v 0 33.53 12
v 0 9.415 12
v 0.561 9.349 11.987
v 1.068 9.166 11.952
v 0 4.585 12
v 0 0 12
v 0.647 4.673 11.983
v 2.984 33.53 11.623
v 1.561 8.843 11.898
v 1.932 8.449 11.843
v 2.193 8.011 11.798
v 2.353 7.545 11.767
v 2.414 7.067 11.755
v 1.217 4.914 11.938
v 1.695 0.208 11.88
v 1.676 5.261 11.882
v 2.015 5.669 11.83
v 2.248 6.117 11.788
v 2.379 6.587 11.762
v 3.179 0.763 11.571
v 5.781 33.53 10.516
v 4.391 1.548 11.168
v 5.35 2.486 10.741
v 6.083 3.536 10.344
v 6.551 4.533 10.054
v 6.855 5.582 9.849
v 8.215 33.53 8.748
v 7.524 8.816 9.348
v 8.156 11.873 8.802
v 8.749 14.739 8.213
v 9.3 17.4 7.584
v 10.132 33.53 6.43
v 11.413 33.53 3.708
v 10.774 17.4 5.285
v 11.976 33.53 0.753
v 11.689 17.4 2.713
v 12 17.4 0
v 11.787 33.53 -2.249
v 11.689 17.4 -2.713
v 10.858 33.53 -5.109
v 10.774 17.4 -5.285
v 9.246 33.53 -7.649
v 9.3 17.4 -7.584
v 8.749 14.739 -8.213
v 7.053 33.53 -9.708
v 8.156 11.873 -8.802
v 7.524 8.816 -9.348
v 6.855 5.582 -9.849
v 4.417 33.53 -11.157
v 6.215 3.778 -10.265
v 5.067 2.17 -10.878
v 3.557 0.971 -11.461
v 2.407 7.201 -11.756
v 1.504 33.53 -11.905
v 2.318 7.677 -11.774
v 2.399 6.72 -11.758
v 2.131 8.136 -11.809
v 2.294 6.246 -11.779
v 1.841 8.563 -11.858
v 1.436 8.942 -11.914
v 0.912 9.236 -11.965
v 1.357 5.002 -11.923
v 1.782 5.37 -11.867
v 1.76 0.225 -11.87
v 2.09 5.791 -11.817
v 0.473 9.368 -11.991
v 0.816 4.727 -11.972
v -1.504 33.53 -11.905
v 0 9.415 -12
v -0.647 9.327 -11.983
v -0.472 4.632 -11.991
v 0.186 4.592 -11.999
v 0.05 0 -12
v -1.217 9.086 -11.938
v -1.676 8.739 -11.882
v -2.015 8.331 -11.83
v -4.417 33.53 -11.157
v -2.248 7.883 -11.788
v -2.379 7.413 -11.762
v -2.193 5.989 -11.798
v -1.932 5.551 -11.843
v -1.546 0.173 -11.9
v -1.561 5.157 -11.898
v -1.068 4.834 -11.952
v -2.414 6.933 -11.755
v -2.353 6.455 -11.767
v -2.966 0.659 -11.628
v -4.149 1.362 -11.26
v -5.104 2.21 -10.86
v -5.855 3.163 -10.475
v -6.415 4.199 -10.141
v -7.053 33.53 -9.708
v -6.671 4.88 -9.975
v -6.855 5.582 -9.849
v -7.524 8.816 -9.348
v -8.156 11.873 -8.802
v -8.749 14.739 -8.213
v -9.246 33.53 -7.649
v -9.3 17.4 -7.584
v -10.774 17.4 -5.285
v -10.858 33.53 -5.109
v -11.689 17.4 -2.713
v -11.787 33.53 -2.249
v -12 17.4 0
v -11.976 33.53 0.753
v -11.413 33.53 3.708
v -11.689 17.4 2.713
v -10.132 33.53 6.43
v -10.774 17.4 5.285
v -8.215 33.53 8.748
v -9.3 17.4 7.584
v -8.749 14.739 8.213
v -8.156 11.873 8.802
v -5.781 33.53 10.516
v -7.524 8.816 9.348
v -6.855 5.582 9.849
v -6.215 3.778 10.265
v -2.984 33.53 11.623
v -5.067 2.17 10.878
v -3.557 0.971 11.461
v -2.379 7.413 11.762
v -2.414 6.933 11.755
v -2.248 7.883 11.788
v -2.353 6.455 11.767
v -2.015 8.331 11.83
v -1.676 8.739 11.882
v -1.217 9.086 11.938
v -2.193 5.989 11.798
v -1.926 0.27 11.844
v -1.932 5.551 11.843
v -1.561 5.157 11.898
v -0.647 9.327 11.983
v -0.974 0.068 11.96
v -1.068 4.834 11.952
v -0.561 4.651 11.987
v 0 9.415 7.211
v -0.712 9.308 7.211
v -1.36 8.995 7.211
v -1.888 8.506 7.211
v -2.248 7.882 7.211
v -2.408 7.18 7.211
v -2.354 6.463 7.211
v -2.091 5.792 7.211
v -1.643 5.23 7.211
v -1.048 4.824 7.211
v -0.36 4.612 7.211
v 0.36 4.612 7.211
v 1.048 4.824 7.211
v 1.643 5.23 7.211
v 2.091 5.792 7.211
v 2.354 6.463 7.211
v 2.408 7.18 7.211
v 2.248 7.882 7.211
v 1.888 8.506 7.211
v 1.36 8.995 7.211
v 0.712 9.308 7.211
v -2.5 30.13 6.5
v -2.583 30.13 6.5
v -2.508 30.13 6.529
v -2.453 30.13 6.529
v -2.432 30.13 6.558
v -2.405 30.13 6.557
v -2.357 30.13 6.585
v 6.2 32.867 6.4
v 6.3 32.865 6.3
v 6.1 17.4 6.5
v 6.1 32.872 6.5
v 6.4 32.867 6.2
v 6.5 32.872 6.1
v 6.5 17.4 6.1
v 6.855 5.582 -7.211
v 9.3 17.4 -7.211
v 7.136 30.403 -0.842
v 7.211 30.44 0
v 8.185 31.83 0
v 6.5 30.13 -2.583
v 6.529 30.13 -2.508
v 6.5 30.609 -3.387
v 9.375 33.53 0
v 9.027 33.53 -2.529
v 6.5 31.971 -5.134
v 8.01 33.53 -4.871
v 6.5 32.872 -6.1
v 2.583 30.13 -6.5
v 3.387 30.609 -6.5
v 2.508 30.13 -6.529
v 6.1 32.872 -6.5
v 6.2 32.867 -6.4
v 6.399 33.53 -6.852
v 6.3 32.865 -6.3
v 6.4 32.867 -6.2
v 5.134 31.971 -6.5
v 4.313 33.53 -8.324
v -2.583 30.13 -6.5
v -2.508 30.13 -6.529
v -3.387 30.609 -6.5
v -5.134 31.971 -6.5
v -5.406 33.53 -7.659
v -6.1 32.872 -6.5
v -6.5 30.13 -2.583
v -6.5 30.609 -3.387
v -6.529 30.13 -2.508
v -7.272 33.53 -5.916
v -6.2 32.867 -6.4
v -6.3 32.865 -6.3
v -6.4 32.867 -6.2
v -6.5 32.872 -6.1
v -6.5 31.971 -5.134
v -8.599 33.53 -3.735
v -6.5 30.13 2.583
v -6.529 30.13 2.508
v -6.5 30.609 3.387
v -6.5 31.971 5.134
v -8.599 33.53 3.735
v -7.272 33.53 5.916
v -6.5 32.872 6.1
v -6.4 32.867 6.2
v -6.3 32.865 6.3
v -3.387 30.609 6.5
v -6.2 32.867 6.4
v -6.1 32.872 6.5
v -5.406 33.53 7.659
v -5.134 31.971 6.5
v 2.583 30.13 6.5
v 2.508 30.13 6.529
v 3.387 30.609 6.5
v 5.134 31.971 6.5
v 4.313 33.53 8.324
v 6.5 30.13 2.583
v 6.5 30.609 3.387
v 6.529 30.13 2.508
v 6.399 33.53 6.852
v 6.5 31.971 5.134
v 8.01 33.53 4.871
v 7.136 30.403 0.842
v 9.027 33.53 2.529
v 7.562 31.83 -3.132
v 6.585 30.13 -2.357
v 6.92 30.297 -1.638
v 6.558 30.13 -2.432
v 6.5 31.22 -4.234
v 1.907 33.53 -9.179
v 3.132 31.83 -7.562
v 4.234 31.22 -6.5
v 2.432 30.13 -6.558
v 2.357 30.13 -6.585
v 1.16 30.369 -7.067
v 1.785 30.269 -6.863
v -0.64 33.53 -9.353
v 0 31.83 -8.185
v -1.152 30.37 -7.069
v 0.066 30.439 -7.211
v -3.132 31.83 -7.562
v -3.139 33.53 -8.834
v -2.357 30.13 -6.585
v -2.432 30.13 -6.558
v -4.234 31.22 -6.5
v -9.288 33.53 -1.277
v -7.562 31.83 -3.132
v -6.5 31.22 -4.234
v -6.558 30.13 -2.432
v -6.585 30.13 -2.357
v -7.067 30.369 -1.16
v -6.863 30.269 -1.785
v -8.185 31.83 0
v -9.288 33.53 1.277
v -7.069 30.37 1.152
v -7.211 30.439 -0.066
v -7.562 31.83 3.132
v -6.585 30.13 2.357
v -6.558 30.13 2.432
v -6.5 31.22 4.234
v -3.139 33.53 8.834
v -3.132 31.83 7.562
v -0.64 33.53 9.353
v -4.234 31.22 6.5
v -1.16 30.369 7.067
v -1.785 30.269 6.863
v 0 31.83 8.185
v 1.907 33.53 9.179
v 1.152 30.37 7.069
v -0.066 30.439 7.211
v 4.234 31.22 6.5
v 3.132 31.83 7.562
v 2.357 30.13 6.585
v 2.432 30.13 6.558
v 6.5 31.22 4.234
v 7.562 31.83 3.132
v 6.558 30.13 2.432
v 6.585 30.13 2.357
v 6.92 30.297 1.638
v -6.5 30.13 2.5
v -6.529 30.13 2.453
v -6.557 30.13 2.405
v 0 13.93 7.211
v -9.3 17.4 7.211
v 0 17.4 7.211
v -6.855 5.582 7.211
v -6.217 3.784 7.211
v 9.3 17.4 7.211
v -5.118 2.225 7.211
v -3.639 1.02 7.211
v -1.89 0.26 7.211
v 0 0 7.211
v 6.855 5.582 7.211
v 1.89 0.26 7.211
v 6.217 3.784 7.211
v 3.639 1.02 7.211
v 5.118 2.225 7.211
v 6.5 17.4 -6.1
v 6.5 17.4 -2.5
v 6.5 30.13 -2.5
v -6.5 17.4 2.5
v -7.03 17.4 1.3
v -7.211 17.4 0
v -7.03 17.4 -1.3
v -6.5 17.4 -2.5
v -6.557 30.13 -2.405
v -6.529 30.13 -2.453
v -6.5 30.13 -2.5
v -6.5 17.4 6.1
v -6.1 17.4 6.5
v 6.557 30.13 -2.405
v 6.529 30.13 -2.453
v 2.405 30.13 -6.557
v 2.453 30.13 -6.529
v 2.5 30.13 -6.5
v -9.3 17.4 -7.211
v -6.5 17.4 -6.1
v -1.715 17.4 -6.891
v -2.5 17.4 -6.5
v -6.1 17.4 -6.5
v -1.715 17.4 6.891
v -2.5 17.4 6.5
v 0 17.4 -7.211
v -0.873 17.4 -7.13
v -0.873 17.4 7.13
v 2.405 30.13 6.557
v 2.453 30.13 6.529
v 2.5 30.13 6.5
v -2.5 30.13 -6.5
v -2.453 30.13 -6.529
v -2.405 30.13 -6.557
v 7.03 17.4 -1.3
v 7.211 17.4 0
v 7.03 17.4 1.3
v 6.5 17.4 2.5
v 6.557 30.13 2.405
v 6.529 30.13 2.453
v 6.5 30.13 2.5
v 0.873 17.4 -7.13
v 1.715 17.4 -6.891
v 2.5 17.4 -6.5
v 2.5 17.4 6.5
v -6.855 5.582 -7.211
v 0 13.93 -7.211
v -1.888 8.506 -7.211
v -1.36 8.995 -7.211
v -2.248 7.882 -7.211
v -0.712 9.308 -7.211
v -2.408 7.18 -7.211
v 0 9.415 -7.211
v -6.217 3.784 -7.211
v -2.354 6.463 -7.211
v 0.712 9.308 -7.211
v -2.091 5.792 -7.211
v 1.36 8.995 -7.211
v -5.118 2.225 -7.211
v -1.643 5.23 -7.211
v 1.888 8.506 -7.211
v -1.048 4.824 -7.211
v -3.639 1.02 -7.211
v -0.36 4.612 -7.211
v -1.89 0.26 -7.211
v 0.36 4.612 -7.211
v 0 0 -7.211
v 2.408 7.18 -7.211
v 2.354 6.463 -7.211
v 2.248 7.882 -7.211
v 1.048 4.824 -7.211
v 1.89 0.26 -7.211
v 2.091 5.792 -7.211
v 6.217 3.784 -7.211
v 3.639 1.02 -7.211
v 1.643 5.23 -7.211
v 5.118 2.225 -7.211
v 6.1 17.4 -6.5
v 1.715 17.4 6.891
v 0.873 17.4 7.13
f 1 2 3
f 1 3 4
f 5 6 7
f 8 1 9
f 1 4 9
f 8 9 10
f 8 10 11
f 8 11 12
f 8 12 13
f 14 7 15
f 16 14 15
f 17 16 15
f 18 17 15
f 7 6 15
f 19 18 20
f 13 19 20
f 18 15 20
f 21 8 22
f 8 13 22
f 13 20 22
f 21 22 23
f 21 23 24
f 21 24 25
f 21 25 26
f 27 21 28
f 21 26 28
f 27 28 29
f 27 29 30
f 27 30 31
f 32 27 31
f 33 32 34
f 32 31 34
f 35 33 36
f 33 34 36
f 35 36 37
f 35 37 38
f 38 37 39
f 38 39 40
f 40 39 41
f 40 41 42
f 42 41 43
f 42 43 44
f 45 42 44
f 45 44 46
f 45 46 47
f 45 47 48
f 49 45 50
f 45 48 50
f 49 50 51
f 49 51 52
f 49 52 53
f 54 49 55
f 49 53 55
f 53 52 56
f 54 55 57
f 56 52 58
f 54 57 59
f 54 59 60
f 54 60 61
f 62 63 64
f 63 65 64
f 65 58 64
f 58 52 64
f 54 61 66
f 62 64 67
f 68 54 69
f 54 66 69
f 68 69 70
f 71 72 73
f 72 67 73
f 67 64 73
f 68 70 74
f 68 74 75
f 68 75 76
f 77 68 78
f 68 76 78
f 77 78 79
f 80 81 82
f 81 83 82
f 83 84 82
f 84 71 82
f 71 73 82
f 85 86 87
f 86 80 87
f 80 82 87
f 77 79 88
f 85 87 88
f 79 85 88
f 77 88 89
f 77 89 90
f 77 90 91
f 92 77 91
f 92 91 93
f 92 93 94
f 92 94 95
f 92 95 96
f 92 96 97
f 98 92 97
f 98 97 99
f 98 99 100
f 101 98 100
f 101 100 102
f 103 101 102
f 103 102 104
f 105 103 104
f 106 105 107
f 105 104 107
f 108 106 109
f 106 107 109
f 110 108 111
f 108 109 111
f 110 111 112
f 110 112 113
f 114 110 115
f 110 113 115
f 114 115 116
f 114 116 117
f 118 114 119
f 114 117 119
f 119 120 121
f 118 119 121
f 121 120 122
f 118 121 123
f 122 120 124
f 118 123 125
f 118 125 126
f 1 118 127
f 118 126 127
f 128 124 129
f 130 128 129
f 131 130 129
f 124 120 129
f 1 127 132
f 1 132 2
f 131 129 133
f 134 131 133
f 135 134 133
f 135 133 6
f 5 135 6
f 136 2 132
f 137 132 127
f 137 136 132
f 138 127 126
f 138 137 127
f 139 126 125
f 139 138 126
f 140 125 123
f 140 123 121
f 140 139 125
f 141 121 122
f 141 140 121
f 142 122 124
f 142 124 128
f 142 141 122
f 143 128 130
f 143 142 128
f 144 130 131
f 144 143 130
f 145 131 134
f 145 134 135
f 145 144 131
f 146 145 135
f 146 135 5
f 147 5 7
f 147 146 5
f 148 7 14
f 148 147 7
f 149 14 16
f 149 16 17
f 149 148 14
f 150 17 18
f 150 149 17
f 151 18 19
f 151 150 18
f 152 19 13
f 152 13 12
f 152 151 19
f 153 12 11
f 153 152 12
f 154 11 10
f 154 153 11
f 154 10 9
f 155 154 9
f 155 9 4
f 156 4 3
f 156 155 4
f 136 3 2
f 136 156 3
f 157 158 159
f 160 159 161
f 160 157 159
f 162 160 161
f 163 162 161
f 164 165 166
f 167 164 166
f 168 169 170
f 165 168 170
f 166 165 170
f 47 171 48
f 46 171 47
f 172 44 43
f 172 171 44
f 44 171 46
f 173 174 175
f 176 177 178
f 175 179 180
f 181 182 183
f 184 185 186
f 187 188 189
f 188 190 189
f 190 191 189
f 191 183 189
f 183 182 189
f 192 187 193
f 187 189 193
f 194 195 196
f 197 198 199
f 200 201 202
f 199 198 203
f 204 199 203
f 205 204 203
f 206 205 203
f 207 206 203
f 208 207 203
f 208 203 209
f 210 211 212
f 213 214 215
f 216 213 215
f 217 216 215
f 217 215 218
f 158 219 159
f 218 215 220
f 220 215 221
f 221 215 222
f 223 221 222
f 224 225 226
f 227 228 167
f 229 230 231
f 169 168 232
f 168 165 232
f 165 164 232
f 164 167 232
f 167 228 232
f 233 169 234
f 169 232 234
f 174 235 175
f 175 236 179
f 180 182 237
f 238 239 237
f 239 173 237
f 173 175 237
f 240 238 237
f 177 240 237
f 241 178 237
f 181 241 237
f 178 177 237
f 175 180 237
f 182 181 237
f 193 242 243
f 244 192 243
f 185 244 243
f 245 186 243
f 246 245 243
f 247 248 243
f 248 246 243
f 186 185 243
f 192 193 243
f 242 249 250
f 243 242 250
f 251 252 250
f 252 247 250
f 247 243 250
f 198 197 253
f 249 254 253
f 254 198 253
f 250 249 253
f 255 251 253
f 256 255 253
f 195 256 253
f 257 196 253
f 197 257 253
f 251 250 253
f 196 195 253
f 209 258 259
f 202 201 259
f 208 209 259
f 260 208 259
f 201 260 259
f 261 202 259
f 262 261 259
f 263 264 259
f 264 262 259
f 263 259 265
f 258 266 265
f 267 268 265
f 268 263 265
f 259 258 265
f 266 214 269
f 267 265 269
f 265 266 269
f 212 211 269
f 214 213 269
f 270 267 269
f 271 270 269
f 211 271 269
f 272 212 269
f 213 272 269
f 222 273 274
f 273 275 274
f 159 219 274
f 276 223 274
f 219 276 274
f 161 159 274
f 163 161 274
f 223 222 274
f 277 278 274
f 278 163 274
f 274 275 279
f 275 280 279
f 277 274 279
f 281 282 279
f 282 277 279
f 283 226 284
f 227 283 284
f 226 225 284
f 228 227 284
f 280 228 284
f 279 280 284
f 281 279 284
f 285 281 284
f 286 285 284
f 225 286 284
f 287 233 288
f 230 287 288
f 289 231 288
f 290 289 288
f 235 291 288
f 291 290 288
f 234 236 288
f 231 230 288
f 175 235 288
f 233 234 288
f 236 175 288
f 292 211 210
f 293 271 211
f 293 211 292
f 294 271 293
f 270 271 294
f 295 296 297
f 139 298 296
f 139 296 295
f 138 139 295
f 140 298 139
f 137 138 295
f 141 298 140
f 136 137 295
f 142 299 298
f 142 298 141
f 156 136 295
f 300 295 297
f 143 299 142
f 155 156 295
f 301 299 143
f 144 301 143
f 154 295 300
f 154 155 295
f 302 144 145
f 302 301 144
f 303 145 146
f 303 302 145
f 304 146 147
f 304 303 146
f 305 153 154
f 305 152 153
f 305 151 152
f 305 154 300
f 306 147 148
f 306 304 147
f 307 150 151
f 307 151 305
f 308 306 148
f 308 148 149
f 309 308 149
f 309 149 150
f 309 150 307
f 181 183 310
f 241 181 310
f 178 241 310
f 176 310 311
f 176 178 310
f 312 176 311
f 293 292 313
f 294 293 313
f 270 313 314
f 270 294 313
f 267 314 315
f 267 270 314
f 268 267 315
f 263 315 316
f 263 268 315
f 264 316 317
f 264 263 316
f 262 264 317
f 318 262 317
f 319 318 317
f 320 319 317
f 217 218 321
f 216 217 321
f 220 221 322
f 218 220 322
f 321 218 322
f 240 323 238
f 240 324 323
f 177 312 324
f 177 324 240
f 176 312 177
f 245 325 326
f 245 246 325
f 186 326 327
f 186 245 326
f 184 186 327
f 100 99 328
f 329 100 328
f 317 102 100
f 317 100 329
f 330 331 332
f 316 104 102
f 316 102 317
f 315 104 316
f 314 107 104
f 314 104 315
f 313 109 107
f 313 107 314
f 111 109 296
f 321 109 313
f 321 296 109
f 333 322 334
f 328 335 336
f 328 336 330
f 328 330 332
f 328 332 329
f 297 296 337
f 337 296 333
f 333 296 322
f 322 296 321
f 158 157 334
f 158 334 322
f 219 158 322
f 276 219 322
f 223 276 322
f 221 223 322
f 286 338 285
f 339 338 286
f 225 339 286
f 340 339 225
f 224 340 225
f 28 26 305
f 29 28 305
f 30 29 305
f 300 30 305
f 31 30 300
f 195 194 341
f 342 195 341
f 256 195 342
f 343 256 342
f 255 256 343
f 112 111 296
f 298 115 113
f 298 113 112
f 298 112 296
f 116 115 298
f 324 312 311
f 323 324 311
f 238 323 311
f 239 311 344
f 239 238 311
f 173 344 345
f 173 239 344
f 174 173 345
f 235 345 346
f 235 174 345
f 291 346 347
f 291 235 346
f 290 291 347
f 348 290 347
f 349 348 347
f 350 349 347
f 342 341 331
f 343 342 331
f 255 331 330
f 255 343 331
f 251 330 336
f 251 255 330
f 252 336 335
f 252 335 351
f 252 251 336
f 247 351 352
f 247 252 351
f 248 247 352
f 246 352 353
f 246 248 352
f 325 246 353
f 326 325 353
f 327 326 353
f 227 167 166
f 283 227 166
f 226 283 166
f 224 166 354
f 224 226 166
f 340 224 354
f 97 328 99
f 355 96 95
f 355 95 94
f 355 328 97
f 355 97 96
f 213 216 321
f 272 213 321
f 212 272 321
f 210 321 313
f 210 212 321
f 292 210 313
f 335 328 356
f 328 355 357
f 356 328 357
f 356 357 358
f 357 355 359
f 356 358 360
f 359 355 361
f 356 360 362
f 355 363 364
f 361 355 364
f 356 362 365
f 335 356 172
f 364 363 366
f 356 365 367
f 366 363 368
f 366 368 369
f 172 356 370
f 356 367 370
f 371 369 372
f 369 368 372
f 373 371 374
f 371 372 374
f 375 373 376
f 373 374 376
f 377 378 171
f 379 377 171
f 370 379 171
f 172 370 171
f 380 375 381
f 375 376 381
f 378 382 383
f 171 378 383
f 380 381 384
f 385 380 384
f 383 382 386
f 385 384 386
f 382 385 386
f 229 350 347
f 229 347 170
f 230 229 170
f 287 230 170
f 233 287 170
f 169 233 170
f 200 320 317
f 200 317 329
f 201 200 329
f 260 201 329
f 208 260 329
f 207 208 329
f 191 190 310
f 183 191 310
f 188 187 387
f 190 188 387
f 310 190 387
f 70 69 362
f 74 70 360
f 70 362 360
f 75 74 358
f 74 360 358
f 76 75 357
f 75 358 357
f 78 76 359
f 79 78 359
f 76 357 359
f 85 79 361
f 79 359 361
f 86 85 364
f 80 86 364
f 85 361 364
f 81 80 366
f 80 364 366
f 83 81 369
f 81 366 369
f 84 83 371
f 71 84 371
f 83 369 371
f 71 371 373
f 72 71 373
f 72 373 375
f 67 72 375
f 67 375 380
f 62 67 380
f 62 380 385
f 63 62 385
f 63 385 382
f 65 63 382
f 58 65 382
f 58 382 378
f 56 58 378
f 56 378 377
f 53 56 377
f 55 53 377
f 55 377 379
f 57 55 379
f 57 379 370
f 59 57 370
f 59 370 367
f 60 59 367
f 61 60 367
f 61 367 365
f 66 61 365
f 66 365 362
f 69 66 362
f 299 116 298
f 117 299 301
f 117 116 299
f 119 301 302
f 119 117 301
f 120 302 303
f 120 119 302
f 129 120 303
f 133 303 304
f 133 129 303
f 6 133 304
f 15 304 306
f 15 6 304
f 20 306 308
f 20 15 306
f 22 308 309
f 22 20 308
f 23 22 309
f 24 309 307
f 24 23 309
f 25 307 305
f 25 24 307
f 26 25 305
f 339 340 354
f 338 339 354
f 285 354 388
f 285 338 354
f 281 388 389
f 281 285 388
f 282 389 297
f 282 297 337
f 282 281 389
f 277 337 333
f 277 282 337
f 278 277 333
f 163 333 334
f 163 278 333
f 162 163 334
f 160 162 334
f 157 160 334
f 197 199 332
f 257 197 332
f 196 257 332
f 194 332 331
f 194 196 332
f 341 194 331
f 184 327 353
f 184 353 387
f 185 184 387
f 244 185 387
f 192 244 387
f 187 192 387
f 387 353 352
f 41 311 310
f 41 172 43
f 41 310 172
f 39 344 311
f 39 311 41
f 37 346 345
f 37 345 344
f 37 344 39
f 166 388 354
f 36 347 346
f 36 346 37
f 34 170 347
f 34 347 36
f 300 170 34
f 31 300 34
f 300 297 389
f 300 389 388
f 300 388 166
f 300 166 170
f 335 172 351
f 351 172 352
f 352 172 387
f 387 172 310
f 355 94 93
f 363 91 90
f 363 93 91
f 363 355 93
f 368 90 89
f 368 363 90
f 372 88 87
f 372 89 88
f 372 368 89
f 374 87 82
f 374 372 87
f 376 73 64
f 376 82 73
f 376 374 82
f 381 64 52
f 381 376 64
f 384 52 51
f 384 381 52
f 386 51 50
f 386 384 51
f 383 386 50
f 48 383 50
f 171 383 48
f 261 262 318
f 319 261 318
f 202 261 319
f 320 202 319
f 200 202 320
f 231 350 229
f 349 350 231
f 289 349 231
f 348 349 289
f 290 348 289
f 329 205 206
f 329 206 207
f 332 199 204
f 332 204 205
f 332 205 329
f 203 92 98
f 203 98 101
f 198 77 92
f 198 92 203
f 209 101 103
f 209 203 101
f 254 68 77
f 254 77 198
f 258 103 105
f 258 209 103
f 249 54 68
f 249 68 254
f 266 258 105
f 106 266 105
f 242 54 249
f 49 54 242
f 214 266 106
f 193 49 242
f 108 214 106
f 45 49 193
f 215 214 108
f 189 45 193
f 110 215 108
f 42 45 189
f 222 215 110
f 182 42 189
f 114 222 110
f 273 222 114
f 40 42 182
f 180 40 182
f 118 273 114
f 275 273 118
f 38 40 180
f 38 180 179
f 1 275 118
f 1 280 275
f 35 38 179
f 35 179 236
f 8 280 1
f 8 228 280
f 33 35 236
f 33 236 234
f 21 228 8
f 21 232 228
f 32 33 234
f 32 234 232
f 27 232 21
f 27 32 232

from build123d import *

# Parameters (mm, degrees)
SKETCH1_R           = 12
BOSS_EXTRUDE1_DEPTH = 33.53
CUT_EXTRUDE1_DEPTH  = 19.6
CHAMFER1_SIZE       = 0.4
SKETCH3_R           = 9.375
CUT_EXTRUDE2_DEPTH  = 3.4
CUT_EXTRUDE2_DRAFT  = -35
SKETCH4_W           = 24
SKETCH4_H           = 14.42225279
CUT_EXTRUDE3_DEPTH  = 17.4
SKETCH5_R           = 2.415
CUT_EXTRUDE4_DEPTH  = 33.7


with BuildPart() as part:
    # Sketch1 → Boss-Extrude1 (new body)
    with BuildSketch(Plane(origin=(0, 0, 0), x_dir=(1, 0, 0), z_dir=(0, 1, 0))):
        with Locations(Location((0, 0, 0), (0, 0, 270))):
            Circle(SKETCH1_R)
    extrude(amount=BOSS_EXTRUDE1_DEPTH)

    # Sketch2 → Cut-Extrude1 (cut)
    with BuildSketch(Plane(origin=(0, 33.53, 0), x_dir=(1, 0, 0), z_dir=(0, 1, 0))):
        with BuildLine():
            Line((-6.5, 6.5), (-2.5, 6.5))
            ThreePointArc((-2.5, 6.5), (0, 7.211126395), (2.5, 6.5))
            Line((2.5, 6.5), (6.5, 6.5))
            Line((6.5, 6.5), (6.5, 2.5))
            ThreePointArc((6.5, 2.5), (7.211126395, 0), (6.5, -2.5))
            Line((6.5, -2.5), (6.5, -6.5))
            Line((6.5, -6.5), (2.5, -6.5))
            ThreePointArc((2.5, -6.5), (0, -7.211126395), (-2.5, -6.5))
            Line((-2.5, -6.5), (-6.5, -6.5))
            Line((-6.5, -6.5), (-6.5, -2.5))
            ThreePointArc((-6.5, -2.5), (-7.211126395, 0), (-6.5, 2.5))
            Line((-6.5, 2.5), (-6.5, 6.5))
        make_face()
    extrude(amount=-CUT_EXTRUDE1_DEPTH, mode=Mode.SUBTRACT)

    # Chamfer1
    chamfer1_edges = [part.edges().sort_by_distance(p)[0] for p in [
        (-6.5, 23.73, -6.5),
        (6.5, 23.73, -6.5),
        (6.5, 23.73, 6.5),
        (-6.5, 23.73, 6.5),
    ]]
    chamfer(chamfer1_edges, length=CHAMFER1_SIZE)


with BuildPart() as cut_extrude2_tool:
    # Sketch3 → Cut-Extrude2 (with draft: the straight prism first)
    with BuildSketch(Plane(origin=(0, 33.53, 0), x_dir=(1, 0, 0), z_dir=(0, 1, 0))):
        Circle(SKETCH3_R)
    extrude(amount=-CUT_EXTRUDE2_DEPTH)
    # Cut-Extrude2: the draft: its side faces are tilted about the plane it starts from
    cut_extrude2_sides = [cut_extrude2_tool.faces().sort_by_distance(p)[0] for p in [
        (-9.375, 31.83, 0),
    ]]
    draft(cut_extrude2_sides, Plane(origin=(0, 33.53, 0), x_dir=(1, 0, 0), z_dir=(0, 1, 0)), CUT_EXTRUDE2_DRAFT)


with BuildPart() as part_1:
    add(part.part)

    # Cut-Extrude2: cut by cut_extrude2_tool
    add(cut_extrude2_tool.part, mode=Mode.SUBTRACT)

    # Sketch4 → Cut-Extrude3 (cut)
    with BuildSketch(Plane.XZ):
        Rectangle(SKETCH4_W, SKETCH4_H)
    extrude(amount=-CUT_EXTRUDE3_DEPTH, mode=Mode.SUBTRACT)

    # Sketch5 → Cut-Extrude4 (cut, symmetric)
    with BuildSketch(Plane.XY):
        with Locations(Location((0, 7, 0), (0, 0, 90))):
            Circle(SKETCH5_R)
        with BuildLine():
            ThreePointArc((-6.854820161, 5.581747356), (0, 0), (6.854820161, 5.581747356))
            Line((6.854820161, 5.581747356), (9.3, 17.4))
            Line((9.3, 17.4), (12, 17.4))
            Line((12, 17.4), (12, -3.192277431))
            Line((12, -3.192277431), (-12, -3.192277431))
            Line((-12, -3.192277431), (-12, 17.4))
            Line((-12, 17.4), (-9.3, 17.4))
            Line((-9.3, 17.4), (-6.854820161, 5.581747356))
        make_face()
    extrude(amount=CUT_EXTRUDE4_DEPTH, both=True, mode=Mode.SUBTRACT)


solid = part_1.part
